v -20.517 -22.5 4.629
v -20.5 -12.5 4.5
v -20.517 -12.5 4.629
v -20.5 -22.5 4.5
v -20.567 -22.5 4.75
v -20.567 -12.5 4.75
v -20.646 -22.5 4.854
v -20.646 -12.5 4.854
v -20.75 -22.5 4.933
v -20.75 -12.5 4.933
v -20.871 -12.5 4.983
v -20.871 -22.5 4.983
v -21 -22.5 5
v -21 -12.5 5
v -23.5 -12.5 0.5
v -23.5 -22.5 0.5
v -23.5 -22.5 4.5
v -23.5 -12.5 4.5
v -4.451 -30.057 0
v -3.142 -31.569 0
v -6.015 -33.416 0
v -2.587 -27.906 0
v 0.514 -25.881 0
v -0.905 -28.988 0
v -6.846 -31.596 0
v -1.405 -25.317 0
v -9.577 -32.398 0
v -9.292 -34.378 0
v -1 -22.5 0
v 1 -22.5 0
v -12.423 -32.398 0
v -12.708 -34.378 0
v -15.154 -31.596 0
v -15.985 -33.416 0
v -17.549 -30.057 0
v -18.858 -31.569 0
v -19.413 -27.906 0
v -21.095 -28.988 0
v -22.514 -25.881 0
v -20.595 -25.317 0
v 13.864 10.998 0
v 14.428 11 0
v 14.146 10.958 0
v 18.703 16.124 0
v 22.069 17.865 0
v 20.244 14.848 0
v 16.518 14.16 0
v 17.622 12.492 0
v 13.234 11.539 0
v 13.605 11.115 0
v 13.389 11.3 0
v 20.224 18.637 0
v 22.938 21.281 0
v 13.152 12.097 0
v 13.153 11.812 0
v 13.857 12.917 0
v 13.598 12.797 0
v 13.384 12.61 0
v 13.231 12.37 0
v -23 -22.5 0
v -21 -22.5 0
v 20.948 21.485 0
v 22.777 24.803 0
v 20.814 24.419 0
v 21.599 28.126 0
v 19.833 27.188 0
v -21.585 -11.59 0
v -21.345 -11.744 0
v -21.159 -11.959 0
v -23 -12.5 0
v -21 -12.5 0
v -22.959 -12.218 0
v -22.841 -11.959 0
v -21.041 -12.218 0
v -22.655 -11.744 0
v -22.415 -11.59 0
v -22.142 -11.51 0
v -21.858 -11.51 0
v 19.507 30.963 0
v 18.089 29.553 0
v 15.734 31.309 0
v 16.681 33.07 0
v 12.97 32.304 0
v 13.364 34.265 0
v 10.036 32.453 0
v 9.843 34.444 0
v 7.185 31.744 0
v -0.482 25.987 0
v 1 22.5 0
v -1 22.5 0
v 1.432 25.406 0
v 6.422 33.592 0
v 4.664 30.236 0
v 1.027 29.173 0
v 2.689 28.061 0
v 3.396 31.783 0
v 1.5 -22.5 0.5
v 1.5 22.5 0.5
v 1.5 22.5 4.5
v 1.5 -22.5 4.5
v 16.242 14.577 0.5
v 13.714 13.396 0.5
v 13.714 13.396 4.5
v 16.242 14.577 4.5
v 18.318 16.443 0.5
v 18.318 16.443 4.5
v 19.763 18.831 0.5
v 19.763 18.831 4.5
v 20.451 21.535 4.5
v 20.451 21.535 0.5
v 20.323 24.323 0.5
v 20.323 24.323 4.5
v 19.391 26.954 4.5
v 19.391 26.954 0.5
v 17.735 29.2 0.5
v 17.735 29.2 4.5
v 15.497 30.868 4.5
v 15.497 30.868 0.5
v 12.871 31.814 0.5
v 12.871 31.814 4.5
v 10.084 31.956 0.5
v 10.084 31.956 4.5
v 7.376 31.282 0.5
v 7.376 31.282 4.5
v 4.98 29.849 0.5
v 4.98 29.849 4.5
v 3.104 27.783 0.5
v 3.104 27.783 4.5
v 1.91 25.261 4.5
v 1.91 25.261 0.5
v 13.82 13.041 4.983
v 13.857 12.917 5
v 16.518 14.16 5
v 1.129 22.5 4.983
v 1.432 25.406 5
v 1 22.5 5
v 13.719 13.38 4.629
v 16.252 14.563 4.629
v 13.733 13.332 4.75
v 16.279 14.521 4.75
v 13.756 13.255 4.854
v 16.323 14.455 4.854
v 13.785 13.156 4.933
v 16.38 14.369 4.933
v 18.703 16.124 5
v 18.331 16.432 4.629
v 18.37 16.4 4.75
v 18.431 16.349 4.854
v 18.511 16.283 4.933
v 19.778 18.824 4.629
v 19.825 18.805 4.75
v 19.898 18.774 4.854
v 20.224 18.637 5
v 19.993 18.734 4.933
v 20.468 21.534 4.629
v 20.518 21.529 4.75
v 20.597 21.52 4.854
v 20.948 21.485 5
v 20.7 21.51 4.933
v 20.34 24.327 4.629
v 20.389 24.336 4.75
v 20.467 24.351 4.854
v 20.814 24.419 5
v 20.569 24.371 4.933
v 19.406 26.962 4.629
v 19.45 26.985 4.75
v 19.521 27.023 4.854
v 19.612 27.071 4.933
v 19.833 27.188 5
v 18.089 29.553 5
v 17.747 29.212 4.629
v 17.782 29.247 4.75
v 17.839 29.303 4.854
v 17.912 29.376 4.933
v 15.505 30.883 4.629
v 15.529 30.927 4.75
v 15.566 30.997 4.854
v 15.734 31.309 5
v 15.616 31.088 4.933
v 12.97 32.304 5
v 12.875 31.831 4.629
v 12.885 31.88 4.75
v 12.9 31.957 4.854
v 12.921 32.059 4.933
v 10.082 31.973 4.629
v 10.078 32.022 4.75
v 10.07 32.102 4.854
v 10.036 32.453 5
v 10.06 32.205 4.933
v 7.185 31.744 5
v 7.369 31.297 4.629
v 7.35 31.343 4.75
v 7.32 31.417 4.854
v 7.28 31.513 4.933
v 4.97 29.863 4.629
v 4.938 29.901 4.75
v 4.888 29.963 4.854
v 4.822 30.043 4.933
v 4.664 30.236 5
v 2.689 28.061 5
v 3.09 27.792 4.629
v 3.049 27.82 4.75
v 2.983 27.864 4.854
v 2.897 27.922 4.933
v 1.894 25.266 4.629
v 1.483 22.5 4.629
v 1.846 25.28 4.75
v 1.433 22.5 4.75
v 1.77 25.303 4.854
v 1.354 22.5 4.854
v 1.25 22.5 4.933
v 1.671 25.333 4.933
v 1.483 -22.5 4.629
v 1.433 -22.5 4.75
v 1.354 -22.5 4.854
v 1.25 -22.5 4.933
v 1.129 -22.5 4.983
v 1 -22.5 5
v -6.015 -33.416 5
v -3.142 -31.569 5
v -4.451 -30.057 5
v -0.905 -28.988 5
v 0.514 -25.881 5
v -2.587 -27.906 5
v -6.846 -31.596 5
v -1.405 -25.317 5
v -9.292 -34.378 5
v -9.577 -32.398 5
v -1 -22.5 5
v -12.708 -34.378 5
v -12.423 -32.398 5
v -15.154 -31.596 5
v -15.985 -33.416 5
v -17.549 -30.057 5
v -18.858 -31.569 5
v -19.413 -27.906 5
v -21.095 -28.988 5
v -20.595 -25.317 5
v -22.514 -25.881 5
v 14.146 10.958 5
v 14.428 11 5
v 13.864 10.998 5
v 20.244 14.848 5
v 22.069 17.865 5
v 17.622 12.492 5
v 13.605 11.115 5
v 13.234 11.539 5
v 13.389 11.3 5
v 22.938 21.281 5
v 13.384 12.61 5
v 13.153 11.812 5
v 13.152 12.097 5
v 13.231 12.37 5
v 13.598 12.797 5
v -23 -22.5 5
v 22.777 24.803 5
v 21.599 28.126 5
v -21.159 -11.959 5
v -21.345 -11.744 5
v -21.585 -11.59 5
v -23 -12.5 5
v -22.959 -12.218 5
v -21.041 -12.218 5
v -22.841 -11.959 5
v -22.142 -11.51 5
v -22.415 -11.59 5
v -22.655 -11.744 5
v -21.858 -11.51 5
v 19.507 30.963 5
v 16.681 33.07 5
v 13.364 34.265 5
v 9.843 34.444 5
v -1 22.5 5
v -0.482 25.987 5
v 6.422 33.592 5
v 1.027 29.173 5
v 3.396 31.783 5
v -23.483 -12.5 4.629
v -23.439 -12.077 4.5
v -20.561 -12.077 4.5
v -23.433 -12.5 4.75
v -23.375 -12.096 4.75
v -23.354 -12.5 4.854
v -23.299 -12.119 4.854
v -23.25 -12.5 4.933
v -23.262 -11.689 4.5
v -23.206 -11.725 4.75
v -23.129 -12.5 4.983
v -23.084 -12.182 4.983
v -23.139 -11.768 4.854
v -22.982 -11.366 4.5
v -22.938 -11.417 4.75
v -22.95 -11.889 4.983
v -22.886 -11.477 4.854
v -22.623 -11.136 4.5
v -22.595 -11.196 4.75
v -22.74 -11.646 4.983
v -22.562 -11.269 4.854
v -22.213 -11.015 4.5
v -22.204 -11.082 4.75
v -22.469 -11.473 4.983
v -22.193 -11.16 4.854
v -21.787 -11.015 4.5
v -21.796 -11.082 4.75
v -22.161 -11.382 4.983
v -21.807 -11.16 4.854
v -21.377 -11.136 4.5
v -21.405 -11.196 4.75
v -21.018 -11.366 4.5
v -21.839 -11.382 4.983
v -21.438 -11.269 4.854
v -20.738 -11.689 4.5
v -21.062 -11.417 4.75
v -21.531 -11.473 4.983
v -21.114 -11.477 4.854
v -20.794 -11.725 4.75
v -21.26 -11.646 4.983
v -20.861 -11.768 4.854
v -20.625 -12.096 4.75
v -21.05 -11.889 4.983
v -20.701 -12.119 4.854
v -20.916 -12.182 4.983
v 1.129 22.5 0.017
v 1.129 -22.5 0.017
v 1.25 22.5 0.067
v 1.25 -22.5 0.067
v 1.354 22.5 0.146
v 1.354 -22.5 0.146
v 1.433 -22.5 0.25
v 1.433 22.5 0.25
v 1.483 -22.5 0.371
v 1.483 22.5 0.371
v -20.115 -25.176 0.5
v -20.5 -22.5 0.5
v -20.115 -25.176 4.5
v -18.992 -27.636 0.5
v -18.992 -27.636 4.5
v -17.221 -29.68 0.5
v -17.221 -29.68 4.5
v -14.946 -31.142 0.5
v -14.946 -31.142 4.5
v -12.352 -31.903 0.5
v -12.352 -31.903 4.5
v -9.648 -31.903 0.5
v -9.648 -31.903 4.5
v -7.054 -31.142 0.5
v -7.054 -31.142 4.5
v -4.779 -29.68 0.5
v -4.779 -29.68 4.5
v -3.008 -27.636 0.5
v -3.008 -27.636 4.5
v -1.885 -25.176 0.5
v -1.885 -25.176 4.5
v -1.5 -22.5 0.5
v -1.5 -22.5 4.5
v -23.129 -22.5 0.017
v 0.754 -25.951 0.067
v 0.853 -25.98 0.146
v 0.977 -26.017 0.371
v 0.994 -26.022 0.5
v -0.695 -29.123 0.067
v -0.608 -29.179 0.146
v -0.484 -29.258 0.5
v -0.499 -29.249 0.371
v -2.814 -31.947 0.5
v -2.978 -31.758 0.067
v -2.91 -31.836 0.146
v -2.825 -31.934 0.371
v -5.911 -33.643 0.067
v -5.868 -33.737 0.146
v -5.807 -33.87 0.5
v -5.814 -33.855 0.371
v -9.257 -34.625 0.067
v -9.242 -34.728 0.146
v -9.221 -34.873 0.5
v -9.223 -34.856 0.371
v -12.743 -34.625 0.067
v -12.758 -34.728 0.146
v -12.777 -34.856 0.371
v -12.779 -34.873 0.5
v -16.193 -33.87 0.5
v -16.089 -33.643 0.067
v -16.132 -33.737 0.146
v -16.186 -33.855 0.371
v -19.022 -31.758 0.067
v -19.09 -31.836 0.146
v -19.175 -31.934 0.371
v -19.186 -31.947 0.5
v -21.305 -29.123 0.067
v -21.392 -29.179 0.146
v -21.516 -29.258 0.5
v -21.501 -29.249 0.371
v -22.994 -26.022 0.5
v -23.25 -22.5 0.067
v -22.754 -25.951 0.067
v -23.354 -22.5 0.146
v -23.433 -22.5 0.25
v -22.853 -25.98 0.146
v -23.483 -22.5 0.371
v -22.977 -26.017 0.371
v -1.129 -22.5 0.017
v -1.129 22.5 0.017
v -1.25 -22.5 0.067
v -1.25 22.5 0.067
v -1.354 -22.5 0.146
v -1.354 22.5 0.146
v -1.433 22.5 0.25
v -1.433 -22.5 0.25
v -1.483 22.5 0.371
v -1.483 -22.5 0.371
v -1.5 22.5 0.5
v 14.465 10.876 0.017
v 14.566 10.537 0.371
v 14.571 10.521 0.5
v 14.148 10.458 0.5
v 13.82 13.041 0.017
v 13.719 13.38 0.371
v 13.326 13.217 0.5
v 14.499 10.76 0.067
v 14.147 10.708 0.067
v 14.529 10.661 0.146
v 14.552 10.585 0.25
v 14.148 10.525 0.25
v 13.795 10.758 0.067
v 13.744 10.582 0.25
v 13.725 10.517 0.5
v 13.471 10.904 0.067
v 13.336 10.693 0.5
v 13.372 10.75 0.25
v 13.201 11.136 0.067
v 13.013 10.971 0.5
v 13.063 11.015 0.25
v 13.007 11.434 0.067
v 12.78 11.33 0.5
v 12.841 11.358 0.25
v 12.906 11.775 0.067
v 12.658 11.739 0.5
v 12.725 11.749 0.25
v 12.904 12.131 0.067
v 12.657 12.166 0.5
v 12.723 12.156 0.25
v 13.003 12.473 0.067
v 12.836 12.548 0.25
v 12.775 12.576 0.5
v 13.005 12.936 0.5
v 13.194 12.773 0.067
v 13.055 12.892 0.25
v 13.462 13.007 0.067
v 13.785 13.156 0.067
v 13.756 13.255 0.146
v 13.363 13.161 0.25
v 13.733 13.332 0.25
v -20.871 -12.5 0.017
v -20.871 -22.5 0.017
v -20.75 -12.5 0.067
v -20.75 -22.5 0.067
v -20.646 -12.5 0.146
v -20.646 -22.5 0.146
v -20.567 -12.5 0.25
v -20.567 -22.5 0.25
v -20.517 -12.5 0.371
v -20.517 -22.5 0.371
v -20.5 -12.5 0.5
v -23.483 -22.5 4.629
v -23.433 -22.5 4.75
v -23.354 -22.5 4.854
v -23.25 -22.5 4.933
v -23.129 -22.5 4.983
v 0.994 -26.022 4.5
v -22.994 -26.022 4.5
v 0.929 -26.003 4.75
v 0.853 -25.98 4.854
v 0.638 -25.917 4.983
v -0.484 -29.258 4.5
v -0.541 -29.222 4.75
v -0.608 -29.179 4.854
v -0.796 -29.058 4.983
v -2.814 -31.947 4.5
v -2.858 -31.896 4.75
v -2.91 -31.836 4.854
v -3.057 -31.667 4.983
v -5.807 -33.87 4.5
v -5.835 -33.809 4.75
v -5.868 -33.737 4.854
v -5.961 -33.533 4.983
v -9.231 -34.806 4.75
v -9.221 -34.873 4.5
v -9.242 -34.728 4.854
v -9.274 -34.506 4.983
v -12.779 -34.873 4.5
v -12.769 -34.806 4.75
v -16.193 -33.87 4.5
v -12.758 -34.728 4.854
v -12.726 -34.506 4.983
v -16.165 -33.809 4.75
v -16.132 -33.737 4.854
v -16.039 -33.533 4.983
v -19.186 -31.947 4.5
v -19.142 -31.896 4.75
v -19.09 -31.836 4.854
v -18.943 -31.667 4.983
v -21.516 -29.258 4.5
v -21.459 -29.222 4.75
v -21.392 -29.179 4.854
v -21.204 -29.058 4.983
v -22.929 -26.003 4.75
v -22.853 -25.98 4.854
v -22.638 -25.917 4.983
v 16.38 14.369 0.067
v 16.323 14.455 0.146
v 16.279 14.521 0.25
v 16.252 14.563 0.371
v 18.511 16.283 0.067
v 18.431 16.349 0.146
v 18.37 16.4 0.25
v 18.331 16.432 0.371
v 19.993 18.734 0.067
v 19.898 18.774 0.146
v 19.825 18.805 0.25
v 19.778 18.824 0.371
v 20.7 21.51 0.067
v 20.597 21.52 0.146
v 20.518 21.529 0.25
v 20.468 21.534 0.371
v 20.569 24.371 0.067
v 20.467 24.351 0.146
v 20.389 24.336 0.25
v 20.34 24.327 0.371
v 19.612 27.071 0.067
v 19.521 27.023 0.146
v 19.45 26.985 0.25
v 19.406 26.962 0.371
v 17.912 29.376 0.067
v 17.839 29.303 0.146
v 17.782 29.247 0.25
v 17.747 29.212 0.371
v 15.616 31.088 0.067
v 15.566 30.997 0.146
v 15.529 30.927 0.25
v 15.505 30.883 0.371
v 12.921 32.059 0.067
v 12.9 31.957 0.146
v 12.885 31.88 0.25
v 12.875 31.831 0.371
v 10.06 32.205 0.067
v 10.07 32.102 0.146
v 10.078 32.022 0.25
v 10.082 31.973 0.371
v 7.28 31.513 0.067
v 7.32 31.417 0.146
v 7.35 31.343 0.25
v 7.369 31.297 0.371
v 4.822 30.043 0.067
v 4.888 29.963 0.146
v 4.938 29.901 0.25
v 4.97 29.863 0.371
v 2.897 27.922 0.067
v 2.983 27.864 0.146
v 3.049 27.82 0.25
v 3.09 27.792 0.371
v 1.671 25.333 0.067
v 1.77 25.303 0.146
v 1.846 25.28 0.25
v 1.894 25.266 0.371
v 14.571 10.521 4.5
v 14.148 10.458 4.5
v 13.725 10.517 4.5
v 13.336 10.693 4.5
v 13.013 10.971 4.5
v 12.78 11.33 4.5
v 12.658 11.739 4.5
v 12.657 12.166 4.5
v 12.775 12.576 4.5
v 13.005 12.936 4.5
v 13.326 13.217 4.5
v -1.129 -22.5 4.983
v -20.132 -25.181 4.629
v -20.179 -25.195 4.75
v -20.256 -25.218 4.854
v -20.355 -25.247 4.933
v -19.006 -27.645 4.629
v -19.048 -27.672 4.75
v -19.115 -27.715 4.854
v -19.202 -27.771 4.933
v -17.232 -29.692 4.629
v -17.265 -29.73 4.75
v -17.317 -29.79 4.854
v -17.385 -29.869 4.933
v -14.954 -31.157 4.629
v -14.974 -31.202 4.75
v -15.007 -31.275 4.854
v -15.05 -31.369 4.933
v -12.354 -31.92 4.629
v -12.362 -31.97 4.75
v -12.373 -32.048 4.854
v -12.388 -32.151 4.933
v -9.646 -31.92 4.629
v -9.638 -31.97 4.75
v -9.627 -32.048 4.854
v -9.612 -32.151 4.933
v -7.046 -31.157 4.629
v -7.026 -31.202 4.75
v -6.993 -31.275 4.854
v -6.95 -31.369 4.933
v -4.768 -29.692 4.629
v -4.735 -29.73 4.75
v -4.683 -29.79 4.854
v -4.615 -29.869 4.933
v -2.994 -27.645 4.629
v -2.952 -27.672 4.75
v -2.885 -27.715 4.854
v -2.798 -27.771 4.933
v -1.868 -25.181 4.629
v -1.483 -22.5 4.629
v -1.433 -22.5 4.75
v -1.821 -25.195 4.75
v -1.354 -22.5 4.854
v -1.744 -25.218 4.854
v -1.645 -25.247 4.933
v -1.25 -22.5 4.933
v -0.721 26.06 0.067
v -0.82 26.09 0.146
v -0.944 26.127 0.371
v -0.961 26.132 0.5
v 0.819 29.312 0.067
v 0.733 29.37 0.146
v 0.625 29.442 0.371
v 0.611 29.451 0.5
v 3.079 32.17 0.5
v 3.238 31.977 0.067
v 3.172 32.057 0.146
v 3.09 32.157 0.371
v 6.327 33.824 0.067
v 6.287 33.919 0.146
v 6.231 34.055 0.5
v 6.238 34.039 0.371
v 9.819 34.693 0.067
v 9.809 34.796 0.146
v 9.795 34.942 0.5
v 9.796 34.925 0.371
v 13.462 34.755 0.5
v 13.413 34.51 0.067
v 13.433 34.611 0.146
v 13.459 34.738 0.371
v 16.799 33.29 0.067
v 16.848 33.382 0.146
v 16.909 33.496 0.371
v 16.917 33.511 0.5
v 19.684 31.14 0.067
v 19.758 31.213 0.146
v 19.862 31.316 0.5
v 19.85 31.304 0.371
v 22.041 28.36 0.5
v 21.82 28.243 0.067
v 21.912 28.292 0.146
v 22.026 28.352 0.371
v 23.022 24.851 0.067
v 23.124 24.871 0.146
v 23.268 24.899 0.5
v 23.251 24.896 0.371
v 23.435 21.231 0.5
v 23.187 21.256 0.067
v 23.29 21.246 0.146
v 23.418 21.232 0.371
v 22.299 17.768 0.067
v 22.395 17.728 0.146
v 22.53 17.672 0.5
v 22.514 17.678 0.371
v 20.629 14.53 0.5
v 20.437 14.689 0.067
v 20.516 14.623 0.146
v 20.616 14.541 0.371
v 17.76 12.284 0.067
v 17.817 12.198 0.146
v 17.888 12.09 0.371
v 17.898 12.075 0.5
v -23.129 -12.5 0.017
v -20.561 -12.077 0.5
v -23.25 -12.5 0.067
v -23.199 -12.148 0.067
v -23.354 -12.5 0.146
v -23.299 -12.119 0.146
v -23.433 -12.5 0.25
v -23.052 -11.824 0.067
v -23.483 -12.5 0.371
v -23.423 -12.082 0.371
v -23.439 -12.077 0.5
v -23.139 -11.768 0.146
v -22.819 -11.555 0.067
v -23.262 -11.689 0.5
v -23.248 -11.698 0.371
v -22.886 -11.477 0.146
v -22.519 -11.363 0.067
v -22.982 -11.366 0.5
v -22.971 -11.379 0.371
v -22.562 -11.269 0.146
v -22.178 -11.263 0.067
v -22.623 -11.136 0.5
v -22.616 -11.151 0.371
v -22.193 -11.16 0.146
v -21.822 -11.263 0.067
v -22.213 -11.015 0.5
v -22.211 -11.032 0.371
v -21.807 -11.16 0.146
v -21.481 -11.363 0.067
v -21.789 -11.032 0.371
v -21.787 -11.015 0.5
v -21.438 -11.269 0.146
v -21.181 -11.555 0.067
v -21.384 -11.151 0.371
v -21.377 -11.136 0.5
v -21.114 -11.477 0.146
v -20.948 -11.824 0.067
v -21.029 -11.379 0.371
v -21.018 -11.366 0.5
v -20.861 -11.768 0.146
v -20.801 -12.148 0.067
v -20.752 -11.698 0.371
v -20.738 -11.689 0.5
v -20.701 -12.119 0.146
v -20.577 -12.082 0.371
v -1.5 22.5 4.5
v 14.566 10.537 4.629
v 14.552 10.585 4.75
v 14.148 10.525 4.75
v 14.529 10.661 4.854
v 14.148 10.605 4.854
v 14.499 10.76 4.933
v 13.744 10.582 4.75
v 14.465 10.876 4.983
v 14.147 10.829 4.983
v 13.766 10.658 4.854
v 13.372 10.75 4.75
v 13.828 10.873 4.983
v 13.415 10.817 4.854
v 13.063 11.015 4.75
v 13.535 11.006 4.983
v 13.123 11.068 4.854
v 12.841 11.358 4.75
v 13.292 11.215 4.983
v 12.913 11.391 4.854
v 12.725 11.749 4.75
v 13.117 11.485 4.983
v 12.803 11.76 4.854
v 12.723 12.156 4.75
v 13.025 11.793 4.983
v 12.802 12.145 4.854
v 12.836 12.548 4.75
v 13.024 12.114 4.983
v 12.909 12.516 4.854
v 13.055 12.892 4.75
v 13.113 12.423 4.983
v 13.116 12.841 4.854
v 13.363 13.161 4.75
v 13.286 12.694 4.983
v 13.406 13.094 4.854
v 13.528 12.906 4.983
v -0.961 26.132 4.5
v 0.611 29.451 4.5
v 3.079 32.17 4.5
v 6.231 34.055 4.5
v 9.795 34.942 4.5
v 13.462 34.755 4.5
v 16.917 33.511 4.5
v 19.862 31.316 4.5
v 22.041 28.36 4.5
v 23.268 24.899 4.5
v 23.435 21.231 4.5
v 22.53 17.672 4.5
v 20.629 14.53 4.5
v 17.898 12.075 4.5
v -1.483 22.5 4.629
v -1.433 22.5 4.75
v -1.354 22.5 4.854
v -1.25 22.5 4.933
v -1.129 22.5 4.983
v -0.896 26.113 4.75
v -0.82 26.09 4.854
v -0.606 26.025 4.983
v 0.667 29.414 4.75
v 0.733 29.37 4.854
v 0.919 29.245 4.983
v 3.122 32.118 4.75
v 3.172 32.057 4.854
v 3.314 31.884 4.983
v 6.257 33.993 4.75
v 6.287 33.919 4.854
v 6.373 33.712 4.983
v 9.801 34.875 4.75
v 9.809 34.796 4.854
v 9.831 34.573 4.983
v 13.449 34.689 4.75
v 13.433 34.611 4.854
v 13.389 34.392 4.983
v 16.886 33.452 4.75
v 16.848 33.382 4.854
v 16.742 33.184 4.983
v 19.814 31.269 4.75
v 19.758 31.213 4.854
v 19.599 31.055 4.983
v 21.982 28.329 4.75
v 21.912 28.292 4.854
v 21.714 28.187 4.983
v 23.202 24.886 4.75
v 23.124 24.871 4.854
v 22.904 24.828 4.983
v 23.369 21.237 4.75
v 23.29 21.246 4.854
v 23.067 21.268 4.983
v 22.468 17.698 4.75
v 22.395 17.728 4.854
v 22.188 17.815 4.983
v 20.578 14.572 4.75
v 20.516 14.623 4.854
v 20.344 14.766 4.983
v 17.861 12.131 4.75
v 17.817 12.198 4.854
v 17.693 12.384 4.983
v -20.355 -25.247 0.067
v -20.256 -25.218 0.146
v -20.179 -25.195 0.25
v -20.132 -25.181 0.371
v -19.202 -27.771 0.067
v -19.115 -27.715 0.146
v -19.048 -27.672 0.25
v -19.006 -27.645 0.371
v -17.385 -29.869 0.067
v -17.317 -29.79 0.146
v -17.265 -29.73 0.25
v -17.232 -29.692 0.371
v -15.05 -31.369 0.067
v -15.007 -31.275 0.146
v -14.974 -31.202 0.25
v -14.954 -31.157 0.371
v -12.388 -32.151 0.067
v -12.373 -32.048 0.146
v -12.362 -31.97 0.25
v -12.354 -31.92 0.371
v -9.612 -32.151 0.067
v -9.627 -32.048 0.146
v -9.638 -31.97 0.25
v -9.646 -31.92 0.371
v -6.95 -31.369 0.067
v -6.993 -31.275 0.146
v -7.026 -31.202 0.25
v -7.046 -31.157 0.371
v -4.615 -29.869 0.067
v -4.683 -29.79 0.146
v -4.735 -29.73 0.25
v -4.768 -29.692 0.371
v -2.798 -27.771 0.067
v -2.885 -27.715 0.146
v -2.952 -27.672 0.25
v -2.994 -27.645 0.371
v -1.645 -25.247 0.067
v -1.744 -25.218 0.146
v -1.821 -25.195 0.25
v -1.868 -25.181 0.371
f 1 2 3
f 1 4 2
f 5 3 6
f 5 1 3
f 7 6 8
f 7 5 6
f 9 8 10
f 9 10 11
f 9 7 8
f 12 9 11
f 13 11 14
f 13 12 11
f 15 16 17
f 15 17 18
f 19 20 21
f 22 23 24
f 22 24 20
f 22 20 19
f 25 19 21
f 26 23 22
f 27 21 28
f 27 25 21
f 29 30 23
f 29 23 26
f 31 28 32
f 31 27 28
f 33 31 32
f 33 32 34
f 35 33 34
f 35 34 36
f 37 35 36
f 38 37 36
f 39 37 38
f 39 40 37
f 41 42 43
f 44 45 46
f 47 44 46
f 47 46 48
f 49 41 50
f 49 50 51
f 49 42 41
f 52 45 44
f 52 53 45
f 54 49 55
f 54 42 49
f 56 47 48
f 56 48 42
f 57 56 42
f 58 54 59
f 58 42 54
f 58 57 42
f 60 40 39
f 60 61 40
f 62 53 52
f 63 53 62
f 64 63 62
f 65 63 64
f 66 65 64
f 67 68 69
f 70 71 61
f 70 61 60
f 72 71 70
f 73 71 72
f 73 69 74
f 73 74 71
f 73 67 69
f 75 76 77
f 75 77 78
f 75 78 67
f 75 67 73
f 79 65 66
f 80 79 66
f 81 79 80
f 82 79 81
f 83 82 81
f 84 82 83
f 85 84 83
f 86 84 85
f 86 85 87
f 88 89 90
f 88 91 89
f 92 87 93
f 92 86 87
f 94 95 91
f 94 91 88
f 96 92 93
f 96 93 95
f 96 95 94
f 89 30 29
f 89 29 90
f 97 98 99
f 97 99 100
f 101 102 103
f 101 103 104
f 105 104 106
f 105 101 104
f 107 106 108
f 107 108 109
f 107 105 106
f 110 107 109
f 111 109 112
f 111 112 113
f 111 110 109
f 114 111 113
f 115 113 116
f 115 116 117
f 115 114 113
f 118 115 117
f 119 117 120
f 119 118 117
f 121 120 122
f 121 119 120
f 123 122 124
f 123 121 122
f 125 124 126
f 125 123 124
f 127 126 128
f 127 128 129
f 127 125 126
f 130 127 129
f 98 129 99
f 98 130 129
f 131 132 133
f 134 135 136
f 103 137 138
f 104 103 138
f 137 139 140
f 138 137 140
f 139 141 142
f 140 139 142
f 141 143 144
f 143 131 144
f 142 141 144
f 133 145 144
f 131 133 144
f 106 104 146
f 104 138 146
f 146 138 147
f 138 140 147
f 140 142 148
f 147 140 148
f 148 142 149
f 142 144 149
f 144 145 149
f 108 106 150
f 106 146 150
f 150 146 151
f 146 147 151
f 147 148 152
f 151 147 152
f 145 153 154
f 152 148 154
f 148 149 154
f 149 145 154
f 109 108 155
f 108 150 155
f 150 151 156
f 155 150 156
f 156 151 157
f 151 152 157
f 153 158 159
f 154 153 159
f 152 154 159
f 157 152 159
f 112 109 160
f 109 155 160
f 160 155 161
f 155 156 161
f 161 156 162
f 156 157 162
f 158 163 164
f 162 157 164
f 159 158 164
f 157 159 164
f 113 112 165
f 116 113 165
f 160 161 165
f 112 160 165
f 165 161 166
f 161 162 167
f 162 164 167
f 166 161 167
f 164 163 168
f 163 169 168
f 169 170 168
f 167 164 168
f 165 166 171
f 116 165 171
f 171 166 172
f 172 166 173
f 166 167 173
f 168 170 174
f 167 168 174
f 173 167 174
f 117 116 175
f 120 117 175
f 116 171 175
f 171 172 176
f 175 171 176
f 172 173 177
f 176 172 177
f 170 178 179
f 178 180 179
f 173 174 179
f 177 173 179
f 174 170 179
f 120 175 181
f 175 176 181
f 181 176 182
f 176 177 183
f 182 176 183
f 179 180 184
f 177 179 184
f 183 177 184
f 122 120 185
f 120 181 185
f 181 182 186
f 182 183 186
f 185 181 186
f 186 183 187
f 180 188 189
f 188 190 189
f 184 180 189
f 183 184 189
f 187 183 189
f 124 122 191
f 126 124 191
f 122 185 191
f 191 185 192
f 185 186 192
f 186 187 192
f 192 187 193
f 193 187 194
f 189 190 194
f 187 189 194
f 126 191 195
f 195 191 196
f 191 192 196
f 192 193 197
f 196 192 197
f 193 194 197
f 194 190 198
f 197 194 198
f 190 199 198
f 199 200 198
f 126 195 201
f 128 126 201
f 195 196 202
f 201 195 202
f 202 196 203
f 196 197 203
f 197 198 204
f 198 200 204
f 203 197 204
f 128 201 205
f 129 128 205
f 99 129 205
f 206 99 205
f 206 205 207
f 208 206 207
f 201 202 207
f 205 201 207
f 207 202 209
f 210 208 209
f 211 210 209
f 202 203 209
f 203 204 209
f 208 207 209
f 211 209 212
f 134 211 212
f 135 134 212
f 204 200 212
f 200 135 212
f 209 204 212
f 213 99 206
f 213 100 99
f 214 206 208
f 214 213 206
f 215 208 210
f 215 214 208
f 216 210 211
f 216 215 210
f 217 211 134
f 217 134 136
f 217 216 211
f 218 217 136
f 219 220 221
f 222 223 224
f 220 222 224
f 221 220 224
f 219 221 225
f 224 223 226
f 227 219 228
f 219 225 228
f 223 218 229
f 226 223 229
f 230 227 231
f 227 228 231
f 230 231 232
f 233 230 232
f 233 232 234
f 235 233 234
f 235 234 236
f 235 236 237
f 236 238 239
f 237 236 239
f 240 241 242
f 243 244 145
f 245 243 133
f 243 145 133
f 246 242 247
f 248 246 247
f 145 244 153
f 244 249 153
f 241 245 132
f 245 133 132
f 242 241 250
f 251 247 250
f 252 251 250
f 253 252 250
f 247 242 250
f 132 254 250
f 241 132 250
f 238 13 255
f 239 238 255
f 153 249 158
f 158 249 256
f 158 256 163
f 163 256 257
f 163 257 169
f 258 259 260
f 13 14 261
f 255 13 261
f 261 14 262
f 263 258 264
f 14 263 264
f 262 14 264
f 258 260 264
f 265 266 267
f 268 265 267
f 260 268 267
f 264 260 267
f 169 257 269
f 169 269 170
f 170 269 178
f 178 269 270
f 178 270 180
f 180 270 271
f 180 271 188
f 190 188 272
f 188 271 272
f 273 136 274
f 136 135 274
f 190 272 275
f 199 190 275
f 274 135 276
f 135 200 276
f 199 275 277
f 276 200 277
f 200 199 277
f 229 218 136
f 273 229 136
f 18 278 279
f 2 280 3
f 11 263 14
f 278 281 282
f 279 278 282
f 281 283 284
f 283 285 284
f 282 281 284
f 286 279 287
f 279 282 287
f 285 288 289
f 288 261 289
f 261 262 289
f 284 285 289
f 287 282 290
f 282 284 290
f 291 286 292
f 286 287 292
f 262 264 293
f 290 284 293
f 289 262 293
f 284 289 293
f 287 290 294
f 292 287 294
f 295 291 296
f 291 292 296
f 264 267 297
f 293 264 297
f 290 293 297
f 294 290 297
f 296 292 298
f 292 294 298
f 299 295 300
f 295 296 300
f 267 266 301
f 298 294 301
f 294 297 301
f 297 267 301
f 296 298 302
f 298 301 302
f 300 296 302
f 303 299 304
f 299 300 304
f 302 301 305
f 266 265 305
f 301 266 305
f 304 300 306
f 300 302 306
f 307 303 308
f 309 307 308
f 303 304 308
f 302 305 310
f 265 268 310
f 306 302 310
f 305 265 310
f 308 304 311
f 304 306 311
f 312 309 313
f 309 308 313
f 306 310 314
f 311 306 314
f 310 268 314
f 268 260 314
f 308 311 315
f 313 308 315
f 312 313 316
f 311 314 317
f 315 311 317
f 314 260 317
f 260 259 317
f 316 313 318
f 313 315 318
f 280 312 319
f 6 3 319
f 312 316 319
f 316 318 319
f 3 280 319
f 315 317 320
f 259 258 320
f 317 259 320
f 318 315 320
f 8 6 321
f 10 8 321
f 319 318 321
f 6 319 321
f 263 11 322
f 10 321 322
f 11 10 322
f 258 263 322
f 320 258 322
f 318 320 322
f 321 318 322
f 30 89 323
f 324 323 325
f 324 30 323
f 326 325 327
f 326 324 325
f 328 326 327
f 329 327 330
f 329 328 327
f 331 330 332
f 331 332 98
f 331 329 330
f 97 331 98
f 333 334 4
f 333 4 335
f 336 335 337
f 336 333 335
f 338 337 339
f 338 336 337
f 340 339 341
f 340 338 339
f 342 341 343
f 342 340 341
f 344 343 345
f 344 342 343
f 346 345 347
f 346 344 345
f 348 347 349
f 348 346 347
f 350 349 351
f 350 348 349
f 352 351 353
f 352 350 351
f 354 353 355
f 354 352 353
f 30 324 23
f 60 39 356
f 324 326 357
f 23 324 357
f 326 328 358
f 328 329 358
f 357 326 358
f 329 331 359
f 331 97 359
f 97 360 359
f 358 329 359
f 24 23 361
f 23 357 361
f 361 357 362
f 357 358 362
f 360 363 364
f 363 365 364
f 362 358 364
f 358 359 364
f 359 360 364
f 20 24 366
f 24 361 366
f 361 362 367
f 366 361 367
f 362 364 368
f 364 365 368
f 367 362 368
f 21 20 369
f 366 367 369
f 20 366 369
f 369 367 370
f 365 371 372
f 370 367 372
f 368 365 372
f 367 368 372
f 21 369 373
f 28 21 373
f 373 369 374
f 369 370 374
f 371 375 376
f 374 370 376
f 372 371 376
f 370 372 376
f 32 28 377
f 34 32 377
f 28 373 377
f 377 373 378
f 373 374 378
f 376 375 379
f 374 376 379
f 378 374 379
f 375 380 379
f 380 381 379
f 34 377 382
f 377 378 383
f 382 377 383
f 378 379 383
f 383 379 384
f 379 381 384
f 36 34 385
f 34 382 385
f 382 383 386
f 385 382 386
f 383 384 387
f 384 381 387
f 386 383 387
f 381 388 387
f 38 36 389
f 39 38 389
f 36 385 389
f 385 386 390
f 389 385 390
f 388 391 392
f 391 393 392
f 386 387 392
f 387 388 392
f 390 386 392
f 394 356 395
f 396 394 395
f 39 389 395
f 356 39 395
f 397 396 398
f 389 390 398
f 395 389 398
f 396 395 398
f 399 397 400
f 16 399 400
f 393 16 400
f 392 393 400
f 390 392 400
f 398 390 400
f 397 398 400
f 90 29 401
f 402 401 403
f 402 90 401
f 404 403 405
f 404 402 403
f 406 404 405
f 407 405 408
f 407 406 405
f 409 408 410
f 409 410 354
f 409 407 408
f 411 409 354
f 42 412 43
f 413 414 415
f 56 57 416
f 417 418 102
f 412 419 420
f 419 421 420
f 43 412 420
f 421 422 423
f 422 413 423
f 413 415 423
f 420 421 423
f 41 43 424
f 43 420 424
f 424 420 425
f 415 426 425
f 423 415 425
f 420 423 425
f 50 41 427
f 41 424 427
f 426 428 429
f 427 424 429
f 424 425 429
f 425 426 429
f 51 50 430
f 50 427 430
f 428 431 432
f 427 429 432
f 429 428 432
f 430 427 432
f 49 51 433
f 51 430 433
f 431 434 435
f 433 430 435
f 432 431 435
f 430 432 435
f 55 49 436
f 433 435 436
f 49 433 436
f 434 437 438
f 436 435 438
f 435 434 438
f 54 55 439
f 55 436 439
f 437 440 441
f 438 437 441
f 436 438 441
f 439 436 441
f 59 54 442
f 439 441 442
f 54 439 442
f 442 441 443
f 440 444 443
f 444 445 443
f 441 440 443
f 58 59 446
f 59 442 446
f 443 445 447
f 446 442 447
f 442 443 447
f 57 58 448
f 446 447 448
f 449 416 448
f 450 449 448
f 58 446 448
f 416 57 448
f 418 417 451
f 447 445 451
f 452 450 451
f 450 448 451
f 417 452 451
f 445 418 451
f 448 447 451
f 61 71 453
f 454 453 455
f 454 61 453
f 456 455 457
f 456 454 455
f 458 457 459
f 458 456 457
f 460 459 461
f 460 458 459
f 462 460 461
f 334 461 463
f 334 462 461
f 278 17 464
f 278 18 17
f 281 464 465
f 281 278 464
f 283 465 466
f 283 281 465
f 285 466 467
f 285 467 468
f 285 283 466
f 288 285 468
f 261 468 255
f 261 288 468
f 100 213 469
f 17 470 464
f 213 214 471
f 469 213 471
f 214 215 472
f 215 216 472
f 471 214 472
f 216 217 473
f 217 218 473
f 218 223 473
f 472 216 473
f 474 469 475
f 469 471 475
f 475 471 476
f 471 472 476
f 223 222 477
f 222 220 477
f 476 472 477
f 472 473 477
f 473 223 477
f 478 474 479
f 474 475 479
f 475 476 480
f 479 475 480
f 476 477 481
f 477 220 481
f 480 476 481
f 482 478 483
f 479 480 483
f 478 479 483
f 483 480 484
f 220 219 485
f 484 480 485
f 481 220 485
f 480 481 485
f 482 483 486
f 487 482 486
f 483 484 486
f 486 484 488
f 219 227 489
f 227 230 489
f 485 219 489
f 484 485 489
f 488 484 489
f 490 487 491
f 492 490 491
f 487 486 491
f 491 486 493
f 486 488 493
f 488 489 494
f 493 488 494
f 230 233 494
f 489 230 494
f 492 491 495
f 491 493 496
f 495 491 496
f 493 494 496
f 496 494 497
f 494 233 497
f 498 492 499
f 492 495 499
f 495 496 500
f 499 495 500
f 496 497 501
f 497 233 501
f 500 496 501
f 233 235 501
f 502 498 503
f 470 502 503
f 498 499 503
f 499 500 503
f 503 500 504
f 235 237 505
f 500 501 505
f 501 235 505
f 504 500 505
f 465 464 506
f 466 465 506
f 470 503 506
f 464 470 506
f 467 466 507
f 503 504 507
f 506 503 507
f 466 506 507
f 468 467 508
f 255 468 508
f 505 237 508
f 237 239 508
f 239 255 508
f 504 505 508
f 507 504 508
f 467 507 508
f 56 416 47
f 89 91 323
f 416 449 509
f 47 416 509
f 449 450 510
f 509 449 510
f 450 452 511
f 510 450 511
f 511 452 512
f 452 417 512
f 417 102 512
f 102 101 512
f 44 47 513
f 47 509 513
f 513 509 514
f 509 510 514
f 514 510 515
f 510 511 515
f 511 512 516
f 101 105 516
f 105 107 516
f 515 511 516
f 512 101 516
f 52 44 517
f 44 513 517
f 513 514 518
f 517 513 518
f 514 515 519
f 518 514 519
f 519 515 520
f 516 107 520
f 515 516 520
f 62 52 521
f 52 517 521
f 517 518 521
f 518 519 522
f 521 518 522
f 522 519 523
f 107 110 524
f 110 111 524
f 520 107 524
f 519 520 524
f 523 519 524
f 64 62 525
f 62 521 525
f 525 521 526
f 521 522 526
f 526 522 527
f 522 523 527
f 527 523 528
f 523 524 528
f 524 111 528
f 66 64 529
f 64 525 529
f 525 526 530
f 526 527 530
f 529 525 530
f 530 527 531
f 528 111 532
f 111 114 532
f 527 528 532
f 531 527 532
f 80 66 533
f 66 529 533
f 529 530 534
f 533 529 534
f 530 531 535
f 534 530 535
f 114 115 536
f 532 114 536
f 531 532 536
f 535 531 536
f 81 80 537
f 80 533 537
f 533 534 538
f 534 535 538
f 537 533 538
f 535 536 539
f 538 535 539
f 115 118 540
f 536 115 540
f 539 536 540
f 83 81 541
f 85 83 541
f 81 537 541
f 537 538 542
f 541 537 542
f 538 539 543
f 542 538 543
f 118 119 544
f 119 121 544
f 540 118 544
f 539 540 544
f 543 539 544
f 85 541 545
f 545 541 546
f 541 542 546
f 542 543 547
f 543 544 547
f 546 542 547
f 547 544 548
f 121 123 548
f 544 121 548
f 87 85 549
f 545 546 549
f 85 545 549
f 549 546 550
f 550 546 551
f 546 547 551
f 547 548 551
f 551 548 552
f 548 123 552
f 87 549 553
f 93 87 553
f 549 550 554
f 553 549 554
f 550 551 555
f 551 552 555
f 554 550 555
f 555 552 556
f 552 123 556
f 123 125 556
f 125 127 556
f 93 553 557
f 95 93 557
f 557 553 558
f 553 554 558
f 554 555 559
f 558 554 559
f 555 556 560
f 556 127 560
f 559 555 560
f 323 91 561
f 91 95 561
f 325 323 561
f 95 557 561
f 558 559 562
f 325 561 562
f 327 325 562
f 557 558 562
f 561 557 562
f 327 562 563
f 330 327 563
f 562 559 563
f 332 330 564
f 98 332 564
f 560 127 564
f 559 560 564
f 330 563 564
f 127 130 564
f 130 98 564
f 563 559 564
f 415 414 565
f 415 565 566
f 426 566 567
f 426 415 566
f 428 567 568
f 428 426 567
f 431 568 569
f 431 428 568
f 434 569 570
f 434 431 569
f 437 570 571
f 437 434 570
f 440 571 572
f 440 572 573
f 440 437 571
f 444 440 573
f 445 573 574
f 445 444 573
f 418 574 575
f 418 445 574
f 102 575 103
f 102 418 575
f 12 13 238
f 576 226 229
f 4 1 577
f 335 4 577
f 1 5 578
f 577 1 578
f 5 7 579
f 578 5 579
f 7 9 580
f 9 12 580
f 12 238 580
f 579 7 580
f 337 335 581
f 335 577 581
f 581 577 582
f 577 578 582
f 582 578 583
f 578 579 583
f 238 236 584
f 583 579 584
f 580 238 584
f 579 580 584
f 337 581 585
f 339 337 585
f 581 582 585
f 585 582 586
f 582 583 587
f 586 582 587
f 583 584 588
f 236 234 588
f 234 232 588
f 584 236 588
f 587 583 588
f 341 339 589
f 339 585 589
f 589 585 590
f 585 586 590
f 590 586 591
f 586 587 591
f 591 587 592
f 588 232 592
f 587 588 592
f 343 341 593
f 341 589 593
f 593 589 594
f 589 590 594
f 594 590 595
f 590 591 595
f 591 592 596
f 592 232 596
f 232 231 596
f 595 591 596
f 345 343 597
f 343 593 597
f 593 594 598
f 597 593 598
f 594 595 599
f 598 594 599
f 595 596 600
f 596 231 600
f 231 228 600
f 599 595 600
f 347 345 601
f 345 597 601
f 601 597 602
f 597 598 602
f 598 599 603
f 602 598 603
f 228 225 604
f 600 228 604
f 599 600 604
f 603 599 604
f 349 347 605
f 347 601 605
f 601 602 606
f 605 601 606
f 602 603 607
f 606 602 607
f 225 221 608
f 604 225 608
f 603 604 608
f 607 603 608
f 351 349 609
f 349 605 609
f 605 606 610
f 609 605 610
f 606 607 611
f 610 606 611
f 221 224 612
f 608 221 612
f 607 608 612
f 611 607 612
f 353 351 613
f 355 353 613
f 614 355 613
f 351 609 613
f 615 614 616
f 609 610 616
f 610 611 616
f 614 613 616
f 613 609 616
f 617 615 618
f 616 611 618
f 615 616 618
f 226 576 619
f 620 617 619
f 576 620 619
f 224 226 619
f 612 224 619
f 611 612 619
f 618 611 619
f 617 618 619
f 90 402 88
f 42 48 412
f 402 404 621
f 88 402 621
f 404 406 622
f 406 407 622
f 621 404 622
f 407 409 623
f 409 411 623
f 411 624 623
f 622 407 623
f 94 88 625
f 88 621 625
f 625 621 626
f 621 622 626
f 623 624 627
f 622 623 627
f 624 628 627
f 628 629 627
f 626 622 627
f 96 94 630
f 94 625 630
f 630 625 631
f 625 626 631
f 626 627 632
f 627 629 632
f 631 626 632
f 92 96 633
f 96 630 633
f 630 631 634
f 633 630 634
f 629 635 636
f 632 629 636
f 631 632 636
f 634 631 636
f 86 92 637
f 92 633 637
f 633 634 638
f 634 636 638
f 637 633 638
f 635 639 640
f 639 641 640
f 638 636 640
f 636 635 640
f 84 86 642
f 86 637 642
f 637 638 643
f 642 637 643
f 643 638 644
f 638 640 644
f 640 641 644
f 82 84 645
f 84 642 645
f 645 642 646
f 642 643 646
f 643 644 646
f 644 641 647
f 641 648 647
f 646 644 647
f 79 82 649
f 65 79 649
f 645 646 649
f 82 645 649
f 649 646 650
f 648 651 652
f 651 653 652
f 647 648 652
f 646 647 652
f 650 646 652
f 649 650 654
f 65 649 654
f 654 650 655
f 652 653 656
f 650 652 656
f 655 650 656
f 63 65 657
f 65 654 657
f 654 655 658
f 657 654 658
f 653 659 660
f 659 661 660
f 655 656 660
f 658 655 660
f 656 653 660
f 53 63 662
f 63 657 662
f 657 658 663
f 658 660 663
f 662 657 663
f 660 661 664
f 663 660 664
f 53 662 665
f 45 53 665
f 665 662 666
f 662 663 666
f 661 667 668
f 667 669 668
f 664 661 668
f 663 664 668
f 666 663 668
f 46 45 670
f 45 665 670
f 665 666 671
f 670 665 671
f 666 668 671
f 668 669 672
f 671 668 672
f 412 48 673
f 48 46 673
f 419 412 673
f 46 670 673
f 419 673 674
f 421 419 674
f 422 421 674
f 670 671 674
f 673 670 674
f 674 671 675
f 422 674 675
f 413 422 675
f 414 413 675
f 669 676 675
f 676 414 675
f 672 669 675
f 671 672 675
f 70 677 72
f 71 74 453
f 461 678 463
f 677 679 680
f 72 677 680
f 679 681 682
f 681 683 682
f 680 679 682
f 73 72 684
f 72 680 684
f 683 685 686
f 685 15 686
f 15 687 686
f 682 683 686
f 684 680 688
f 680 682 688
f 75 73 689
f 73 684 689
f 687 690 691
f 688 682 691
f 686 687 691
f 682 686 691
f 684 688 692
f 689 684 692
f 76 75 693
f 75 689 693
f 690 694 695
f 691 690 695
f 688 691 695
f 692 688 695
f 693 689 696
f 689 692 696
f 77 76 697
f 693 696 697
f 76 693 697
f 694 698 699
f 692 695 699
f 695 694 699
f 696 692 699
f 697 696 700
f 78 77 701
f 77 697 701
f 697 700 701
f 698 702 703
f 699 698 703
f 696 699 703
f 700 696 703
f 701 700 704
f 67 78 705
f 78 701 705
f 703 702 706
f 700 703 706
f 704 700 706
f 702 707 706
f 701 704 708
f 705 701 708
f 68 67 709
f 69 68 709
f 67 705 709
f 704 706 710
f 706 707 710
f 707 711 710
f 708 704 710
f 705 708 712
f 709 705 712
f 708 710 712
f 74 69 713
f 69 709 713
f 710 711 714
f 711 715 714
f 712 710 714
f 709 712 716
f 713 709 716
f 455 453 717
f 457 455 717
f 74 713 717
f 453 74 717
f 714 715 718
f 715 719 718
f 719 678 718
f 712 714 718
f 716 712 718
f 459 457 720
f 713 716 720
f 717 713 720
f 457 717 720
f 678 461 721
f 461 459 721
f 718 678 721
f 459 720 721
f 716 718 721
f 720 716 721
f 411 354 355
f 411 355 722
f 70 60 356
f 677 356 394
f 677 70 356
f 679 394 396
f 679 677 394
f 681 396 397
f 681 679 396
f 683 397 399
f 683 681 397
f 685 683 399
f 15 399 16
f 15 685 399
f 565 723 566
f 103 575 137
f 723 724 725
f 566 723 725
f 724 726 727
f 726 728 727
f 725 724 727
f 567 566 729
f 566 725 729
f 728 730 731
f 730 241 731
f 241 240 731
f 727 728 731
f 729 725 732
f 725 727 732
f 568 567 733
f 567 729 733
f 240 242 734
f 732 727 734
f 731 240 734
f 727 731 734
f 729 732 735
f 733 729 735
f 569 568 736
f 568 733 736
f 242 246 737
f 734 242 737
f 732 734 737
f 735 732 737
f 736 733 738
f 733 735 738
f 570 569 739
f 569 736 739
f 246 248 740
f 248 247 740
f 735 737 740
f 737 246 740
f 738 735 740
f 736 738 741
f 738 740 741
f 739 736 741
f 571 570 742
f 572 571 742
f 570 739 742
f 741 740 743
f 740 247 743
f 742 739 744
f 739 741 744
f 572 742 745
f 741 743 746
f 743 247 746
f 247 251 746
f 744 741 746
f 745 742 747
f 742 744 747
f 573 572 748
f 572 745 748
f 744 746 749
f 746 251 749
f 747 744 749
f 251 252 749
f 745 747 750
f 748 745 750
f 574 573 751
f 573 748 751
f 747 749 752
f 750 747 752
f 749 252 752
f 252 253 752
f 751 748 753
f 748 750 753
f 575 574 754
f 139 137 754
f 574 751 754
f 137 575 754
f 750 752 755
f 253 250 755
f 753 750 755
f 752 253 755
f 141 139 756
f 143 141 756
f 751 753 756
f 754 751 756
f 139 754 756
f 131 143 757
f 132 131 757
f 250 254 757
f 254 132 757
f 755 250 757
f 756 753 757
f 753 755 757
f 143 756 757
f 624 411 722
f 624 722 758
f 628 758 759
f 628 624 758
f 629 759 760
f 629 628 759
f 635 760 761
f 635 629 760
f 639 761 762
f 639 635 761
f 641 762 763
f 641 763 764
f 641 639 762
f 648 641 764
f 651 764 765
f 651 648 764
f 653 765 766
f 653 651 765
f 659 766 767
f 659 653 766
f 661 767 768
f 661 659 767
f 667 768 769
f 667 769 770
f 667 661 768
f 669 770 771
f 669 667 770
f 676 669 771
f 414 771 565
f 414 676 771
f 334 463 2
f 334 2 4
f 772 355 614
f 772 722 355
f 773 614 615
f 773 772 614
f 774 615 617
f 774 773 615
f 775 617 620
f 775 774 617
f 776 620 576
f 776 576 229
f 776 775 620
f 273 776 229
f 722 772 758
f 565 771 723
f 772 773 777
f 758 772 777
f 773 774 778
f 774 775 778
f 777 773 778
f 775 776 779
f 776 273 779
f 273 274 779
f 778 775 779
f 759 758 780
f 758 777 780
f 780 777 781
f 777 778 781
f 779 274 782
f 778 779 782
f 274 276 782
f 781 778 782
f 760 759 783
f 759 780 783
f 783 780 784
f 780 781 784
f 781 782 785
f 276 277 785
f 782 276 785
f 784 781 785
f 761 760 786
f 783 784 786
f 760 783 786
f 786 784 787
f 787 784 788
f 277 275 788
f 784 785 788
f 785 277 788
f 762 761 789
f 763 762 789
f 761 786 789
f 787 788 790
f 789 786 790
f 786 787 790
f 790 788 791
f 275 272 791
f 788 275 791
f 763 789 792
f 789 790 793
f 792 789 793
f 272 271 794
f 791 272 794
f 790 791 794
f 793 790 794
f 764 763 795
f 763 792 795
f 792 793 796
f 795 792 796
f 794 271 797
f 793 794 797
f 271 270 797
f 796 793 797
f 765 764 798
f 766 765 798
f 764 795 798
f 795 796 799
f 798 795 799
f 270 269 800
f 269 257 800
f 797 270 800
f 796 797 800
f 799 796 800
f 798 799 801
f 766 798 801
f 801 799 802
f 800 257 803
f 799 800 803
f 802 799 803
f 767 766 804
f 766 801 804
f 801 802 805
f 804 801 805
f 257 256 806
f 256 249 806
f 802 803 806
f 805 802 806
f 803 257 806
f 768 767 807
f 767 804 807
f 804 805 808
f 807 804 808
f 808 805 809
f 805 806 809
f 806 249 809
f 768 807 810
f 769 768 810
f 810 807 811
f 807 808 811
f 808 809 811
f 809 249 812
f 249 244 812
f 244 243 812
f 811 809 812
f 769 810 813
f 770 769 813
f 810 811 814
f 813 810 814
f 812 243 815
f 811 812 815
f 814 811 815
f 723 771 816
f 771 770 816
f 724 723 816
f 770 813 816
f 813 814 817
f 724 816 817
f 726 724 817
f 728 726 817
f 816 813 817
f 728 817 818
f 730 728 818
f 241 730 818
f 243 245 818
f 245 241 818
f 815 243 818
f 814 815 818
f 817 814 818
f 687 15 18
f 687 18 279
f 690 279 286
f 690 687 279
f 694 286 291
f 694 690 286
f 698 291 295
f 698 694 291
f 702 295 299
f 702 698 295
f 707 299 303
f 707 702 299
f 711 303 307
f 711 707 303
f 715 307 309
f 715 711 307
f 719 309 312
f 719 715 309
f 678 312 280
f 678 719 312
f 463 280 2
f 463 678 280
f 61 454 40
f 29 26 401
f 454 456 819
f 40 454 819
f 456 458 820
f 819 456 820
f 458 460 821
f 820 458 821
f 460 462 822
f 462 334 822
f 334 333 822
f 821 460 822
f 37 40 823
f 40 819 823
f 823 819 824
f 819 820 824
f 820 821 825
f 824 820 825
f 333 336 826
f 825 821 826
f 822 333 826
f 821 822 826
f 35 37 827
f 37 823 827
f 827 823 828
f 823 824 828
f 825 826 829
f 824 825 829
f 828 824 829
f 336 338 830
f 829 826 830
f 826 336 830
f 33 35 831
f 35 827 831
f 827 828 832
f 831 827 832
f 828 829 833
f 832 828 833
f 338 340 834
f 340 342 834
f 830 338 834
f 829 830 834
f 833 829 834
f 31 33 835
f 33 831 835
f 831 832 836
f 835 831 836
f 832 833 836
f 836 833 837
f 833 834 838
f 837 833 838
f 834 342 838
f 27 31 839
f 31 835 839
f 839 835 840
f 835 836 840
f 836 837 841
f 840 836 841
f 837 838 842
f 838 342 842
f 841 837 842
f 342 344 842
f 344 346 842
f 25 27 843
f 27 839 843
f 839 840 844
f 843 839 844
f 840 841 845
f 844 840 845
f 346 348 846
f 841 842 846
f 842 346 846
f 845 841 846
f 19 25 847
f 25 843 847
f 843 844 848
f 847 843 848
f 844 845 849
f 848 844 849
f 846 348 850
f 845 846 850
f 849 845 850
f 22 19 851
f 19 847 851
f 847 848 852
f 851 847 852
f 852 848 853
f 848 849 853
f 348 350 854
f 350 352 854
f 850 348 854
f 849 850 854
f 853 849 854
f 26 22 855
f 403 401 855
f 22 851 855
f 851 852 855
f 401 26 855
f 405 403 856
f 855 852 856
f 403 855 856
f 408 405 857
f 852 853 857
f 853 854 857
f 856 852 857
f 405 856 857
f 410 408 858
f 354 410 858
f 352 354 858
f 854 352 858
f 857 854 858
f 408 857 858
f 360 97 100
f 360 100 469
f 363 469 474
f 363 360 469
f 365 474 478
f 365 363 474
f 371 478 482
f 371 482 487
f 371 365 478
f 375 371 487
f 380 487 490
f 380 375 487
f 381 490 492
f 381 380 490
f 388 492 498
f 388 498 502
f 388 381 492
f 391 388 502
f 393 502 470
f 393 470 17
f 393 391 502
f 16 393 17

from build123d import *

# Parameters (mm, degrees)
BOSS_EXTRUDE1_DEPTH = 5
FILLET1_R           = 0.5
FILLET2_R           = 0.5


with BuildPart() as part:
    # Sketch1 → Boss-Extrude1 (new body)
    with BuildSketch(Plane.XY):
        with BuildLine():
            Line((-23.5, -22.5), (-23.5, -12.5))
            ThreePointArc((-23.5, -12.5), (-22, -11), (-20.5, -12.5))
            Line((-20.5, -12.5), (-20.5, -22.5))
            ThreePointArc((-20.5, -22.5), (-11, -32), (-1.5, -22.5))
            Line((-1.5, -22.5), (-1.5, 22.5))
            ThreePointArc((-1.5, 22.5), (18.470503063, 32.522054878), (14.570653438, 10.520833333))
            ThreePointArc((14.570653438, 10.520833333), (12.704675025, 11.529854921), (13.713696613, 13.395833333))
            ThreePointArc((13.713696613, 13.395833333), (16.677582328, 30.116761708), (1.5, 22.5))
            Line((1.5, 22.5), (1.5, -22.5))
            ThreePointArc((1.5, -22.5), (-11, -35), (-23.5, -22.5))
        make_face()
    extrude(amount=BOSS_EXTRUDE1_DEPTH)

    # Fillet1
    fillet1_edges = [part.edges().sort_by_distance(p)[0] for p in [
        (-22, -11, 5),
        (-20.5, -17.5, 5),
        (-11, -32, 5),
        (-1.5, 0, 5),
        (18.470503063, 32.522054878, 5),
        (12.704675025, 11.529854921, 5),
        (16.677582328, 30.116761708, 5),
        (1.5, 0, 5),
        (-11, -35, 5),
        (-23.5, -17.5, 5),
    ]]
    fillet(fillet1_edges, radius=FILLET1_R)

    # Fillet2
    fillet2_edges = [part.edges().sort_by_distance(p)[0] for p in [
        (12.704675025, 11.529854921, 0),
        (18.470503063, 32.522054878, 0),
        (-1.5, 0, 0),
        (-11, -32, 0),
        (-20.5, -17.5, 0),
        (-22, -11, 0),
        (-23.5, -17.5, 0),
        (-11, -35, 0),
        (1.5, 0, 0),
        (16.677582328, 30.116761708, 0),
    ]]
    fillet(fillet2_edges, radius=FILLET2_R)


solid = part.part
